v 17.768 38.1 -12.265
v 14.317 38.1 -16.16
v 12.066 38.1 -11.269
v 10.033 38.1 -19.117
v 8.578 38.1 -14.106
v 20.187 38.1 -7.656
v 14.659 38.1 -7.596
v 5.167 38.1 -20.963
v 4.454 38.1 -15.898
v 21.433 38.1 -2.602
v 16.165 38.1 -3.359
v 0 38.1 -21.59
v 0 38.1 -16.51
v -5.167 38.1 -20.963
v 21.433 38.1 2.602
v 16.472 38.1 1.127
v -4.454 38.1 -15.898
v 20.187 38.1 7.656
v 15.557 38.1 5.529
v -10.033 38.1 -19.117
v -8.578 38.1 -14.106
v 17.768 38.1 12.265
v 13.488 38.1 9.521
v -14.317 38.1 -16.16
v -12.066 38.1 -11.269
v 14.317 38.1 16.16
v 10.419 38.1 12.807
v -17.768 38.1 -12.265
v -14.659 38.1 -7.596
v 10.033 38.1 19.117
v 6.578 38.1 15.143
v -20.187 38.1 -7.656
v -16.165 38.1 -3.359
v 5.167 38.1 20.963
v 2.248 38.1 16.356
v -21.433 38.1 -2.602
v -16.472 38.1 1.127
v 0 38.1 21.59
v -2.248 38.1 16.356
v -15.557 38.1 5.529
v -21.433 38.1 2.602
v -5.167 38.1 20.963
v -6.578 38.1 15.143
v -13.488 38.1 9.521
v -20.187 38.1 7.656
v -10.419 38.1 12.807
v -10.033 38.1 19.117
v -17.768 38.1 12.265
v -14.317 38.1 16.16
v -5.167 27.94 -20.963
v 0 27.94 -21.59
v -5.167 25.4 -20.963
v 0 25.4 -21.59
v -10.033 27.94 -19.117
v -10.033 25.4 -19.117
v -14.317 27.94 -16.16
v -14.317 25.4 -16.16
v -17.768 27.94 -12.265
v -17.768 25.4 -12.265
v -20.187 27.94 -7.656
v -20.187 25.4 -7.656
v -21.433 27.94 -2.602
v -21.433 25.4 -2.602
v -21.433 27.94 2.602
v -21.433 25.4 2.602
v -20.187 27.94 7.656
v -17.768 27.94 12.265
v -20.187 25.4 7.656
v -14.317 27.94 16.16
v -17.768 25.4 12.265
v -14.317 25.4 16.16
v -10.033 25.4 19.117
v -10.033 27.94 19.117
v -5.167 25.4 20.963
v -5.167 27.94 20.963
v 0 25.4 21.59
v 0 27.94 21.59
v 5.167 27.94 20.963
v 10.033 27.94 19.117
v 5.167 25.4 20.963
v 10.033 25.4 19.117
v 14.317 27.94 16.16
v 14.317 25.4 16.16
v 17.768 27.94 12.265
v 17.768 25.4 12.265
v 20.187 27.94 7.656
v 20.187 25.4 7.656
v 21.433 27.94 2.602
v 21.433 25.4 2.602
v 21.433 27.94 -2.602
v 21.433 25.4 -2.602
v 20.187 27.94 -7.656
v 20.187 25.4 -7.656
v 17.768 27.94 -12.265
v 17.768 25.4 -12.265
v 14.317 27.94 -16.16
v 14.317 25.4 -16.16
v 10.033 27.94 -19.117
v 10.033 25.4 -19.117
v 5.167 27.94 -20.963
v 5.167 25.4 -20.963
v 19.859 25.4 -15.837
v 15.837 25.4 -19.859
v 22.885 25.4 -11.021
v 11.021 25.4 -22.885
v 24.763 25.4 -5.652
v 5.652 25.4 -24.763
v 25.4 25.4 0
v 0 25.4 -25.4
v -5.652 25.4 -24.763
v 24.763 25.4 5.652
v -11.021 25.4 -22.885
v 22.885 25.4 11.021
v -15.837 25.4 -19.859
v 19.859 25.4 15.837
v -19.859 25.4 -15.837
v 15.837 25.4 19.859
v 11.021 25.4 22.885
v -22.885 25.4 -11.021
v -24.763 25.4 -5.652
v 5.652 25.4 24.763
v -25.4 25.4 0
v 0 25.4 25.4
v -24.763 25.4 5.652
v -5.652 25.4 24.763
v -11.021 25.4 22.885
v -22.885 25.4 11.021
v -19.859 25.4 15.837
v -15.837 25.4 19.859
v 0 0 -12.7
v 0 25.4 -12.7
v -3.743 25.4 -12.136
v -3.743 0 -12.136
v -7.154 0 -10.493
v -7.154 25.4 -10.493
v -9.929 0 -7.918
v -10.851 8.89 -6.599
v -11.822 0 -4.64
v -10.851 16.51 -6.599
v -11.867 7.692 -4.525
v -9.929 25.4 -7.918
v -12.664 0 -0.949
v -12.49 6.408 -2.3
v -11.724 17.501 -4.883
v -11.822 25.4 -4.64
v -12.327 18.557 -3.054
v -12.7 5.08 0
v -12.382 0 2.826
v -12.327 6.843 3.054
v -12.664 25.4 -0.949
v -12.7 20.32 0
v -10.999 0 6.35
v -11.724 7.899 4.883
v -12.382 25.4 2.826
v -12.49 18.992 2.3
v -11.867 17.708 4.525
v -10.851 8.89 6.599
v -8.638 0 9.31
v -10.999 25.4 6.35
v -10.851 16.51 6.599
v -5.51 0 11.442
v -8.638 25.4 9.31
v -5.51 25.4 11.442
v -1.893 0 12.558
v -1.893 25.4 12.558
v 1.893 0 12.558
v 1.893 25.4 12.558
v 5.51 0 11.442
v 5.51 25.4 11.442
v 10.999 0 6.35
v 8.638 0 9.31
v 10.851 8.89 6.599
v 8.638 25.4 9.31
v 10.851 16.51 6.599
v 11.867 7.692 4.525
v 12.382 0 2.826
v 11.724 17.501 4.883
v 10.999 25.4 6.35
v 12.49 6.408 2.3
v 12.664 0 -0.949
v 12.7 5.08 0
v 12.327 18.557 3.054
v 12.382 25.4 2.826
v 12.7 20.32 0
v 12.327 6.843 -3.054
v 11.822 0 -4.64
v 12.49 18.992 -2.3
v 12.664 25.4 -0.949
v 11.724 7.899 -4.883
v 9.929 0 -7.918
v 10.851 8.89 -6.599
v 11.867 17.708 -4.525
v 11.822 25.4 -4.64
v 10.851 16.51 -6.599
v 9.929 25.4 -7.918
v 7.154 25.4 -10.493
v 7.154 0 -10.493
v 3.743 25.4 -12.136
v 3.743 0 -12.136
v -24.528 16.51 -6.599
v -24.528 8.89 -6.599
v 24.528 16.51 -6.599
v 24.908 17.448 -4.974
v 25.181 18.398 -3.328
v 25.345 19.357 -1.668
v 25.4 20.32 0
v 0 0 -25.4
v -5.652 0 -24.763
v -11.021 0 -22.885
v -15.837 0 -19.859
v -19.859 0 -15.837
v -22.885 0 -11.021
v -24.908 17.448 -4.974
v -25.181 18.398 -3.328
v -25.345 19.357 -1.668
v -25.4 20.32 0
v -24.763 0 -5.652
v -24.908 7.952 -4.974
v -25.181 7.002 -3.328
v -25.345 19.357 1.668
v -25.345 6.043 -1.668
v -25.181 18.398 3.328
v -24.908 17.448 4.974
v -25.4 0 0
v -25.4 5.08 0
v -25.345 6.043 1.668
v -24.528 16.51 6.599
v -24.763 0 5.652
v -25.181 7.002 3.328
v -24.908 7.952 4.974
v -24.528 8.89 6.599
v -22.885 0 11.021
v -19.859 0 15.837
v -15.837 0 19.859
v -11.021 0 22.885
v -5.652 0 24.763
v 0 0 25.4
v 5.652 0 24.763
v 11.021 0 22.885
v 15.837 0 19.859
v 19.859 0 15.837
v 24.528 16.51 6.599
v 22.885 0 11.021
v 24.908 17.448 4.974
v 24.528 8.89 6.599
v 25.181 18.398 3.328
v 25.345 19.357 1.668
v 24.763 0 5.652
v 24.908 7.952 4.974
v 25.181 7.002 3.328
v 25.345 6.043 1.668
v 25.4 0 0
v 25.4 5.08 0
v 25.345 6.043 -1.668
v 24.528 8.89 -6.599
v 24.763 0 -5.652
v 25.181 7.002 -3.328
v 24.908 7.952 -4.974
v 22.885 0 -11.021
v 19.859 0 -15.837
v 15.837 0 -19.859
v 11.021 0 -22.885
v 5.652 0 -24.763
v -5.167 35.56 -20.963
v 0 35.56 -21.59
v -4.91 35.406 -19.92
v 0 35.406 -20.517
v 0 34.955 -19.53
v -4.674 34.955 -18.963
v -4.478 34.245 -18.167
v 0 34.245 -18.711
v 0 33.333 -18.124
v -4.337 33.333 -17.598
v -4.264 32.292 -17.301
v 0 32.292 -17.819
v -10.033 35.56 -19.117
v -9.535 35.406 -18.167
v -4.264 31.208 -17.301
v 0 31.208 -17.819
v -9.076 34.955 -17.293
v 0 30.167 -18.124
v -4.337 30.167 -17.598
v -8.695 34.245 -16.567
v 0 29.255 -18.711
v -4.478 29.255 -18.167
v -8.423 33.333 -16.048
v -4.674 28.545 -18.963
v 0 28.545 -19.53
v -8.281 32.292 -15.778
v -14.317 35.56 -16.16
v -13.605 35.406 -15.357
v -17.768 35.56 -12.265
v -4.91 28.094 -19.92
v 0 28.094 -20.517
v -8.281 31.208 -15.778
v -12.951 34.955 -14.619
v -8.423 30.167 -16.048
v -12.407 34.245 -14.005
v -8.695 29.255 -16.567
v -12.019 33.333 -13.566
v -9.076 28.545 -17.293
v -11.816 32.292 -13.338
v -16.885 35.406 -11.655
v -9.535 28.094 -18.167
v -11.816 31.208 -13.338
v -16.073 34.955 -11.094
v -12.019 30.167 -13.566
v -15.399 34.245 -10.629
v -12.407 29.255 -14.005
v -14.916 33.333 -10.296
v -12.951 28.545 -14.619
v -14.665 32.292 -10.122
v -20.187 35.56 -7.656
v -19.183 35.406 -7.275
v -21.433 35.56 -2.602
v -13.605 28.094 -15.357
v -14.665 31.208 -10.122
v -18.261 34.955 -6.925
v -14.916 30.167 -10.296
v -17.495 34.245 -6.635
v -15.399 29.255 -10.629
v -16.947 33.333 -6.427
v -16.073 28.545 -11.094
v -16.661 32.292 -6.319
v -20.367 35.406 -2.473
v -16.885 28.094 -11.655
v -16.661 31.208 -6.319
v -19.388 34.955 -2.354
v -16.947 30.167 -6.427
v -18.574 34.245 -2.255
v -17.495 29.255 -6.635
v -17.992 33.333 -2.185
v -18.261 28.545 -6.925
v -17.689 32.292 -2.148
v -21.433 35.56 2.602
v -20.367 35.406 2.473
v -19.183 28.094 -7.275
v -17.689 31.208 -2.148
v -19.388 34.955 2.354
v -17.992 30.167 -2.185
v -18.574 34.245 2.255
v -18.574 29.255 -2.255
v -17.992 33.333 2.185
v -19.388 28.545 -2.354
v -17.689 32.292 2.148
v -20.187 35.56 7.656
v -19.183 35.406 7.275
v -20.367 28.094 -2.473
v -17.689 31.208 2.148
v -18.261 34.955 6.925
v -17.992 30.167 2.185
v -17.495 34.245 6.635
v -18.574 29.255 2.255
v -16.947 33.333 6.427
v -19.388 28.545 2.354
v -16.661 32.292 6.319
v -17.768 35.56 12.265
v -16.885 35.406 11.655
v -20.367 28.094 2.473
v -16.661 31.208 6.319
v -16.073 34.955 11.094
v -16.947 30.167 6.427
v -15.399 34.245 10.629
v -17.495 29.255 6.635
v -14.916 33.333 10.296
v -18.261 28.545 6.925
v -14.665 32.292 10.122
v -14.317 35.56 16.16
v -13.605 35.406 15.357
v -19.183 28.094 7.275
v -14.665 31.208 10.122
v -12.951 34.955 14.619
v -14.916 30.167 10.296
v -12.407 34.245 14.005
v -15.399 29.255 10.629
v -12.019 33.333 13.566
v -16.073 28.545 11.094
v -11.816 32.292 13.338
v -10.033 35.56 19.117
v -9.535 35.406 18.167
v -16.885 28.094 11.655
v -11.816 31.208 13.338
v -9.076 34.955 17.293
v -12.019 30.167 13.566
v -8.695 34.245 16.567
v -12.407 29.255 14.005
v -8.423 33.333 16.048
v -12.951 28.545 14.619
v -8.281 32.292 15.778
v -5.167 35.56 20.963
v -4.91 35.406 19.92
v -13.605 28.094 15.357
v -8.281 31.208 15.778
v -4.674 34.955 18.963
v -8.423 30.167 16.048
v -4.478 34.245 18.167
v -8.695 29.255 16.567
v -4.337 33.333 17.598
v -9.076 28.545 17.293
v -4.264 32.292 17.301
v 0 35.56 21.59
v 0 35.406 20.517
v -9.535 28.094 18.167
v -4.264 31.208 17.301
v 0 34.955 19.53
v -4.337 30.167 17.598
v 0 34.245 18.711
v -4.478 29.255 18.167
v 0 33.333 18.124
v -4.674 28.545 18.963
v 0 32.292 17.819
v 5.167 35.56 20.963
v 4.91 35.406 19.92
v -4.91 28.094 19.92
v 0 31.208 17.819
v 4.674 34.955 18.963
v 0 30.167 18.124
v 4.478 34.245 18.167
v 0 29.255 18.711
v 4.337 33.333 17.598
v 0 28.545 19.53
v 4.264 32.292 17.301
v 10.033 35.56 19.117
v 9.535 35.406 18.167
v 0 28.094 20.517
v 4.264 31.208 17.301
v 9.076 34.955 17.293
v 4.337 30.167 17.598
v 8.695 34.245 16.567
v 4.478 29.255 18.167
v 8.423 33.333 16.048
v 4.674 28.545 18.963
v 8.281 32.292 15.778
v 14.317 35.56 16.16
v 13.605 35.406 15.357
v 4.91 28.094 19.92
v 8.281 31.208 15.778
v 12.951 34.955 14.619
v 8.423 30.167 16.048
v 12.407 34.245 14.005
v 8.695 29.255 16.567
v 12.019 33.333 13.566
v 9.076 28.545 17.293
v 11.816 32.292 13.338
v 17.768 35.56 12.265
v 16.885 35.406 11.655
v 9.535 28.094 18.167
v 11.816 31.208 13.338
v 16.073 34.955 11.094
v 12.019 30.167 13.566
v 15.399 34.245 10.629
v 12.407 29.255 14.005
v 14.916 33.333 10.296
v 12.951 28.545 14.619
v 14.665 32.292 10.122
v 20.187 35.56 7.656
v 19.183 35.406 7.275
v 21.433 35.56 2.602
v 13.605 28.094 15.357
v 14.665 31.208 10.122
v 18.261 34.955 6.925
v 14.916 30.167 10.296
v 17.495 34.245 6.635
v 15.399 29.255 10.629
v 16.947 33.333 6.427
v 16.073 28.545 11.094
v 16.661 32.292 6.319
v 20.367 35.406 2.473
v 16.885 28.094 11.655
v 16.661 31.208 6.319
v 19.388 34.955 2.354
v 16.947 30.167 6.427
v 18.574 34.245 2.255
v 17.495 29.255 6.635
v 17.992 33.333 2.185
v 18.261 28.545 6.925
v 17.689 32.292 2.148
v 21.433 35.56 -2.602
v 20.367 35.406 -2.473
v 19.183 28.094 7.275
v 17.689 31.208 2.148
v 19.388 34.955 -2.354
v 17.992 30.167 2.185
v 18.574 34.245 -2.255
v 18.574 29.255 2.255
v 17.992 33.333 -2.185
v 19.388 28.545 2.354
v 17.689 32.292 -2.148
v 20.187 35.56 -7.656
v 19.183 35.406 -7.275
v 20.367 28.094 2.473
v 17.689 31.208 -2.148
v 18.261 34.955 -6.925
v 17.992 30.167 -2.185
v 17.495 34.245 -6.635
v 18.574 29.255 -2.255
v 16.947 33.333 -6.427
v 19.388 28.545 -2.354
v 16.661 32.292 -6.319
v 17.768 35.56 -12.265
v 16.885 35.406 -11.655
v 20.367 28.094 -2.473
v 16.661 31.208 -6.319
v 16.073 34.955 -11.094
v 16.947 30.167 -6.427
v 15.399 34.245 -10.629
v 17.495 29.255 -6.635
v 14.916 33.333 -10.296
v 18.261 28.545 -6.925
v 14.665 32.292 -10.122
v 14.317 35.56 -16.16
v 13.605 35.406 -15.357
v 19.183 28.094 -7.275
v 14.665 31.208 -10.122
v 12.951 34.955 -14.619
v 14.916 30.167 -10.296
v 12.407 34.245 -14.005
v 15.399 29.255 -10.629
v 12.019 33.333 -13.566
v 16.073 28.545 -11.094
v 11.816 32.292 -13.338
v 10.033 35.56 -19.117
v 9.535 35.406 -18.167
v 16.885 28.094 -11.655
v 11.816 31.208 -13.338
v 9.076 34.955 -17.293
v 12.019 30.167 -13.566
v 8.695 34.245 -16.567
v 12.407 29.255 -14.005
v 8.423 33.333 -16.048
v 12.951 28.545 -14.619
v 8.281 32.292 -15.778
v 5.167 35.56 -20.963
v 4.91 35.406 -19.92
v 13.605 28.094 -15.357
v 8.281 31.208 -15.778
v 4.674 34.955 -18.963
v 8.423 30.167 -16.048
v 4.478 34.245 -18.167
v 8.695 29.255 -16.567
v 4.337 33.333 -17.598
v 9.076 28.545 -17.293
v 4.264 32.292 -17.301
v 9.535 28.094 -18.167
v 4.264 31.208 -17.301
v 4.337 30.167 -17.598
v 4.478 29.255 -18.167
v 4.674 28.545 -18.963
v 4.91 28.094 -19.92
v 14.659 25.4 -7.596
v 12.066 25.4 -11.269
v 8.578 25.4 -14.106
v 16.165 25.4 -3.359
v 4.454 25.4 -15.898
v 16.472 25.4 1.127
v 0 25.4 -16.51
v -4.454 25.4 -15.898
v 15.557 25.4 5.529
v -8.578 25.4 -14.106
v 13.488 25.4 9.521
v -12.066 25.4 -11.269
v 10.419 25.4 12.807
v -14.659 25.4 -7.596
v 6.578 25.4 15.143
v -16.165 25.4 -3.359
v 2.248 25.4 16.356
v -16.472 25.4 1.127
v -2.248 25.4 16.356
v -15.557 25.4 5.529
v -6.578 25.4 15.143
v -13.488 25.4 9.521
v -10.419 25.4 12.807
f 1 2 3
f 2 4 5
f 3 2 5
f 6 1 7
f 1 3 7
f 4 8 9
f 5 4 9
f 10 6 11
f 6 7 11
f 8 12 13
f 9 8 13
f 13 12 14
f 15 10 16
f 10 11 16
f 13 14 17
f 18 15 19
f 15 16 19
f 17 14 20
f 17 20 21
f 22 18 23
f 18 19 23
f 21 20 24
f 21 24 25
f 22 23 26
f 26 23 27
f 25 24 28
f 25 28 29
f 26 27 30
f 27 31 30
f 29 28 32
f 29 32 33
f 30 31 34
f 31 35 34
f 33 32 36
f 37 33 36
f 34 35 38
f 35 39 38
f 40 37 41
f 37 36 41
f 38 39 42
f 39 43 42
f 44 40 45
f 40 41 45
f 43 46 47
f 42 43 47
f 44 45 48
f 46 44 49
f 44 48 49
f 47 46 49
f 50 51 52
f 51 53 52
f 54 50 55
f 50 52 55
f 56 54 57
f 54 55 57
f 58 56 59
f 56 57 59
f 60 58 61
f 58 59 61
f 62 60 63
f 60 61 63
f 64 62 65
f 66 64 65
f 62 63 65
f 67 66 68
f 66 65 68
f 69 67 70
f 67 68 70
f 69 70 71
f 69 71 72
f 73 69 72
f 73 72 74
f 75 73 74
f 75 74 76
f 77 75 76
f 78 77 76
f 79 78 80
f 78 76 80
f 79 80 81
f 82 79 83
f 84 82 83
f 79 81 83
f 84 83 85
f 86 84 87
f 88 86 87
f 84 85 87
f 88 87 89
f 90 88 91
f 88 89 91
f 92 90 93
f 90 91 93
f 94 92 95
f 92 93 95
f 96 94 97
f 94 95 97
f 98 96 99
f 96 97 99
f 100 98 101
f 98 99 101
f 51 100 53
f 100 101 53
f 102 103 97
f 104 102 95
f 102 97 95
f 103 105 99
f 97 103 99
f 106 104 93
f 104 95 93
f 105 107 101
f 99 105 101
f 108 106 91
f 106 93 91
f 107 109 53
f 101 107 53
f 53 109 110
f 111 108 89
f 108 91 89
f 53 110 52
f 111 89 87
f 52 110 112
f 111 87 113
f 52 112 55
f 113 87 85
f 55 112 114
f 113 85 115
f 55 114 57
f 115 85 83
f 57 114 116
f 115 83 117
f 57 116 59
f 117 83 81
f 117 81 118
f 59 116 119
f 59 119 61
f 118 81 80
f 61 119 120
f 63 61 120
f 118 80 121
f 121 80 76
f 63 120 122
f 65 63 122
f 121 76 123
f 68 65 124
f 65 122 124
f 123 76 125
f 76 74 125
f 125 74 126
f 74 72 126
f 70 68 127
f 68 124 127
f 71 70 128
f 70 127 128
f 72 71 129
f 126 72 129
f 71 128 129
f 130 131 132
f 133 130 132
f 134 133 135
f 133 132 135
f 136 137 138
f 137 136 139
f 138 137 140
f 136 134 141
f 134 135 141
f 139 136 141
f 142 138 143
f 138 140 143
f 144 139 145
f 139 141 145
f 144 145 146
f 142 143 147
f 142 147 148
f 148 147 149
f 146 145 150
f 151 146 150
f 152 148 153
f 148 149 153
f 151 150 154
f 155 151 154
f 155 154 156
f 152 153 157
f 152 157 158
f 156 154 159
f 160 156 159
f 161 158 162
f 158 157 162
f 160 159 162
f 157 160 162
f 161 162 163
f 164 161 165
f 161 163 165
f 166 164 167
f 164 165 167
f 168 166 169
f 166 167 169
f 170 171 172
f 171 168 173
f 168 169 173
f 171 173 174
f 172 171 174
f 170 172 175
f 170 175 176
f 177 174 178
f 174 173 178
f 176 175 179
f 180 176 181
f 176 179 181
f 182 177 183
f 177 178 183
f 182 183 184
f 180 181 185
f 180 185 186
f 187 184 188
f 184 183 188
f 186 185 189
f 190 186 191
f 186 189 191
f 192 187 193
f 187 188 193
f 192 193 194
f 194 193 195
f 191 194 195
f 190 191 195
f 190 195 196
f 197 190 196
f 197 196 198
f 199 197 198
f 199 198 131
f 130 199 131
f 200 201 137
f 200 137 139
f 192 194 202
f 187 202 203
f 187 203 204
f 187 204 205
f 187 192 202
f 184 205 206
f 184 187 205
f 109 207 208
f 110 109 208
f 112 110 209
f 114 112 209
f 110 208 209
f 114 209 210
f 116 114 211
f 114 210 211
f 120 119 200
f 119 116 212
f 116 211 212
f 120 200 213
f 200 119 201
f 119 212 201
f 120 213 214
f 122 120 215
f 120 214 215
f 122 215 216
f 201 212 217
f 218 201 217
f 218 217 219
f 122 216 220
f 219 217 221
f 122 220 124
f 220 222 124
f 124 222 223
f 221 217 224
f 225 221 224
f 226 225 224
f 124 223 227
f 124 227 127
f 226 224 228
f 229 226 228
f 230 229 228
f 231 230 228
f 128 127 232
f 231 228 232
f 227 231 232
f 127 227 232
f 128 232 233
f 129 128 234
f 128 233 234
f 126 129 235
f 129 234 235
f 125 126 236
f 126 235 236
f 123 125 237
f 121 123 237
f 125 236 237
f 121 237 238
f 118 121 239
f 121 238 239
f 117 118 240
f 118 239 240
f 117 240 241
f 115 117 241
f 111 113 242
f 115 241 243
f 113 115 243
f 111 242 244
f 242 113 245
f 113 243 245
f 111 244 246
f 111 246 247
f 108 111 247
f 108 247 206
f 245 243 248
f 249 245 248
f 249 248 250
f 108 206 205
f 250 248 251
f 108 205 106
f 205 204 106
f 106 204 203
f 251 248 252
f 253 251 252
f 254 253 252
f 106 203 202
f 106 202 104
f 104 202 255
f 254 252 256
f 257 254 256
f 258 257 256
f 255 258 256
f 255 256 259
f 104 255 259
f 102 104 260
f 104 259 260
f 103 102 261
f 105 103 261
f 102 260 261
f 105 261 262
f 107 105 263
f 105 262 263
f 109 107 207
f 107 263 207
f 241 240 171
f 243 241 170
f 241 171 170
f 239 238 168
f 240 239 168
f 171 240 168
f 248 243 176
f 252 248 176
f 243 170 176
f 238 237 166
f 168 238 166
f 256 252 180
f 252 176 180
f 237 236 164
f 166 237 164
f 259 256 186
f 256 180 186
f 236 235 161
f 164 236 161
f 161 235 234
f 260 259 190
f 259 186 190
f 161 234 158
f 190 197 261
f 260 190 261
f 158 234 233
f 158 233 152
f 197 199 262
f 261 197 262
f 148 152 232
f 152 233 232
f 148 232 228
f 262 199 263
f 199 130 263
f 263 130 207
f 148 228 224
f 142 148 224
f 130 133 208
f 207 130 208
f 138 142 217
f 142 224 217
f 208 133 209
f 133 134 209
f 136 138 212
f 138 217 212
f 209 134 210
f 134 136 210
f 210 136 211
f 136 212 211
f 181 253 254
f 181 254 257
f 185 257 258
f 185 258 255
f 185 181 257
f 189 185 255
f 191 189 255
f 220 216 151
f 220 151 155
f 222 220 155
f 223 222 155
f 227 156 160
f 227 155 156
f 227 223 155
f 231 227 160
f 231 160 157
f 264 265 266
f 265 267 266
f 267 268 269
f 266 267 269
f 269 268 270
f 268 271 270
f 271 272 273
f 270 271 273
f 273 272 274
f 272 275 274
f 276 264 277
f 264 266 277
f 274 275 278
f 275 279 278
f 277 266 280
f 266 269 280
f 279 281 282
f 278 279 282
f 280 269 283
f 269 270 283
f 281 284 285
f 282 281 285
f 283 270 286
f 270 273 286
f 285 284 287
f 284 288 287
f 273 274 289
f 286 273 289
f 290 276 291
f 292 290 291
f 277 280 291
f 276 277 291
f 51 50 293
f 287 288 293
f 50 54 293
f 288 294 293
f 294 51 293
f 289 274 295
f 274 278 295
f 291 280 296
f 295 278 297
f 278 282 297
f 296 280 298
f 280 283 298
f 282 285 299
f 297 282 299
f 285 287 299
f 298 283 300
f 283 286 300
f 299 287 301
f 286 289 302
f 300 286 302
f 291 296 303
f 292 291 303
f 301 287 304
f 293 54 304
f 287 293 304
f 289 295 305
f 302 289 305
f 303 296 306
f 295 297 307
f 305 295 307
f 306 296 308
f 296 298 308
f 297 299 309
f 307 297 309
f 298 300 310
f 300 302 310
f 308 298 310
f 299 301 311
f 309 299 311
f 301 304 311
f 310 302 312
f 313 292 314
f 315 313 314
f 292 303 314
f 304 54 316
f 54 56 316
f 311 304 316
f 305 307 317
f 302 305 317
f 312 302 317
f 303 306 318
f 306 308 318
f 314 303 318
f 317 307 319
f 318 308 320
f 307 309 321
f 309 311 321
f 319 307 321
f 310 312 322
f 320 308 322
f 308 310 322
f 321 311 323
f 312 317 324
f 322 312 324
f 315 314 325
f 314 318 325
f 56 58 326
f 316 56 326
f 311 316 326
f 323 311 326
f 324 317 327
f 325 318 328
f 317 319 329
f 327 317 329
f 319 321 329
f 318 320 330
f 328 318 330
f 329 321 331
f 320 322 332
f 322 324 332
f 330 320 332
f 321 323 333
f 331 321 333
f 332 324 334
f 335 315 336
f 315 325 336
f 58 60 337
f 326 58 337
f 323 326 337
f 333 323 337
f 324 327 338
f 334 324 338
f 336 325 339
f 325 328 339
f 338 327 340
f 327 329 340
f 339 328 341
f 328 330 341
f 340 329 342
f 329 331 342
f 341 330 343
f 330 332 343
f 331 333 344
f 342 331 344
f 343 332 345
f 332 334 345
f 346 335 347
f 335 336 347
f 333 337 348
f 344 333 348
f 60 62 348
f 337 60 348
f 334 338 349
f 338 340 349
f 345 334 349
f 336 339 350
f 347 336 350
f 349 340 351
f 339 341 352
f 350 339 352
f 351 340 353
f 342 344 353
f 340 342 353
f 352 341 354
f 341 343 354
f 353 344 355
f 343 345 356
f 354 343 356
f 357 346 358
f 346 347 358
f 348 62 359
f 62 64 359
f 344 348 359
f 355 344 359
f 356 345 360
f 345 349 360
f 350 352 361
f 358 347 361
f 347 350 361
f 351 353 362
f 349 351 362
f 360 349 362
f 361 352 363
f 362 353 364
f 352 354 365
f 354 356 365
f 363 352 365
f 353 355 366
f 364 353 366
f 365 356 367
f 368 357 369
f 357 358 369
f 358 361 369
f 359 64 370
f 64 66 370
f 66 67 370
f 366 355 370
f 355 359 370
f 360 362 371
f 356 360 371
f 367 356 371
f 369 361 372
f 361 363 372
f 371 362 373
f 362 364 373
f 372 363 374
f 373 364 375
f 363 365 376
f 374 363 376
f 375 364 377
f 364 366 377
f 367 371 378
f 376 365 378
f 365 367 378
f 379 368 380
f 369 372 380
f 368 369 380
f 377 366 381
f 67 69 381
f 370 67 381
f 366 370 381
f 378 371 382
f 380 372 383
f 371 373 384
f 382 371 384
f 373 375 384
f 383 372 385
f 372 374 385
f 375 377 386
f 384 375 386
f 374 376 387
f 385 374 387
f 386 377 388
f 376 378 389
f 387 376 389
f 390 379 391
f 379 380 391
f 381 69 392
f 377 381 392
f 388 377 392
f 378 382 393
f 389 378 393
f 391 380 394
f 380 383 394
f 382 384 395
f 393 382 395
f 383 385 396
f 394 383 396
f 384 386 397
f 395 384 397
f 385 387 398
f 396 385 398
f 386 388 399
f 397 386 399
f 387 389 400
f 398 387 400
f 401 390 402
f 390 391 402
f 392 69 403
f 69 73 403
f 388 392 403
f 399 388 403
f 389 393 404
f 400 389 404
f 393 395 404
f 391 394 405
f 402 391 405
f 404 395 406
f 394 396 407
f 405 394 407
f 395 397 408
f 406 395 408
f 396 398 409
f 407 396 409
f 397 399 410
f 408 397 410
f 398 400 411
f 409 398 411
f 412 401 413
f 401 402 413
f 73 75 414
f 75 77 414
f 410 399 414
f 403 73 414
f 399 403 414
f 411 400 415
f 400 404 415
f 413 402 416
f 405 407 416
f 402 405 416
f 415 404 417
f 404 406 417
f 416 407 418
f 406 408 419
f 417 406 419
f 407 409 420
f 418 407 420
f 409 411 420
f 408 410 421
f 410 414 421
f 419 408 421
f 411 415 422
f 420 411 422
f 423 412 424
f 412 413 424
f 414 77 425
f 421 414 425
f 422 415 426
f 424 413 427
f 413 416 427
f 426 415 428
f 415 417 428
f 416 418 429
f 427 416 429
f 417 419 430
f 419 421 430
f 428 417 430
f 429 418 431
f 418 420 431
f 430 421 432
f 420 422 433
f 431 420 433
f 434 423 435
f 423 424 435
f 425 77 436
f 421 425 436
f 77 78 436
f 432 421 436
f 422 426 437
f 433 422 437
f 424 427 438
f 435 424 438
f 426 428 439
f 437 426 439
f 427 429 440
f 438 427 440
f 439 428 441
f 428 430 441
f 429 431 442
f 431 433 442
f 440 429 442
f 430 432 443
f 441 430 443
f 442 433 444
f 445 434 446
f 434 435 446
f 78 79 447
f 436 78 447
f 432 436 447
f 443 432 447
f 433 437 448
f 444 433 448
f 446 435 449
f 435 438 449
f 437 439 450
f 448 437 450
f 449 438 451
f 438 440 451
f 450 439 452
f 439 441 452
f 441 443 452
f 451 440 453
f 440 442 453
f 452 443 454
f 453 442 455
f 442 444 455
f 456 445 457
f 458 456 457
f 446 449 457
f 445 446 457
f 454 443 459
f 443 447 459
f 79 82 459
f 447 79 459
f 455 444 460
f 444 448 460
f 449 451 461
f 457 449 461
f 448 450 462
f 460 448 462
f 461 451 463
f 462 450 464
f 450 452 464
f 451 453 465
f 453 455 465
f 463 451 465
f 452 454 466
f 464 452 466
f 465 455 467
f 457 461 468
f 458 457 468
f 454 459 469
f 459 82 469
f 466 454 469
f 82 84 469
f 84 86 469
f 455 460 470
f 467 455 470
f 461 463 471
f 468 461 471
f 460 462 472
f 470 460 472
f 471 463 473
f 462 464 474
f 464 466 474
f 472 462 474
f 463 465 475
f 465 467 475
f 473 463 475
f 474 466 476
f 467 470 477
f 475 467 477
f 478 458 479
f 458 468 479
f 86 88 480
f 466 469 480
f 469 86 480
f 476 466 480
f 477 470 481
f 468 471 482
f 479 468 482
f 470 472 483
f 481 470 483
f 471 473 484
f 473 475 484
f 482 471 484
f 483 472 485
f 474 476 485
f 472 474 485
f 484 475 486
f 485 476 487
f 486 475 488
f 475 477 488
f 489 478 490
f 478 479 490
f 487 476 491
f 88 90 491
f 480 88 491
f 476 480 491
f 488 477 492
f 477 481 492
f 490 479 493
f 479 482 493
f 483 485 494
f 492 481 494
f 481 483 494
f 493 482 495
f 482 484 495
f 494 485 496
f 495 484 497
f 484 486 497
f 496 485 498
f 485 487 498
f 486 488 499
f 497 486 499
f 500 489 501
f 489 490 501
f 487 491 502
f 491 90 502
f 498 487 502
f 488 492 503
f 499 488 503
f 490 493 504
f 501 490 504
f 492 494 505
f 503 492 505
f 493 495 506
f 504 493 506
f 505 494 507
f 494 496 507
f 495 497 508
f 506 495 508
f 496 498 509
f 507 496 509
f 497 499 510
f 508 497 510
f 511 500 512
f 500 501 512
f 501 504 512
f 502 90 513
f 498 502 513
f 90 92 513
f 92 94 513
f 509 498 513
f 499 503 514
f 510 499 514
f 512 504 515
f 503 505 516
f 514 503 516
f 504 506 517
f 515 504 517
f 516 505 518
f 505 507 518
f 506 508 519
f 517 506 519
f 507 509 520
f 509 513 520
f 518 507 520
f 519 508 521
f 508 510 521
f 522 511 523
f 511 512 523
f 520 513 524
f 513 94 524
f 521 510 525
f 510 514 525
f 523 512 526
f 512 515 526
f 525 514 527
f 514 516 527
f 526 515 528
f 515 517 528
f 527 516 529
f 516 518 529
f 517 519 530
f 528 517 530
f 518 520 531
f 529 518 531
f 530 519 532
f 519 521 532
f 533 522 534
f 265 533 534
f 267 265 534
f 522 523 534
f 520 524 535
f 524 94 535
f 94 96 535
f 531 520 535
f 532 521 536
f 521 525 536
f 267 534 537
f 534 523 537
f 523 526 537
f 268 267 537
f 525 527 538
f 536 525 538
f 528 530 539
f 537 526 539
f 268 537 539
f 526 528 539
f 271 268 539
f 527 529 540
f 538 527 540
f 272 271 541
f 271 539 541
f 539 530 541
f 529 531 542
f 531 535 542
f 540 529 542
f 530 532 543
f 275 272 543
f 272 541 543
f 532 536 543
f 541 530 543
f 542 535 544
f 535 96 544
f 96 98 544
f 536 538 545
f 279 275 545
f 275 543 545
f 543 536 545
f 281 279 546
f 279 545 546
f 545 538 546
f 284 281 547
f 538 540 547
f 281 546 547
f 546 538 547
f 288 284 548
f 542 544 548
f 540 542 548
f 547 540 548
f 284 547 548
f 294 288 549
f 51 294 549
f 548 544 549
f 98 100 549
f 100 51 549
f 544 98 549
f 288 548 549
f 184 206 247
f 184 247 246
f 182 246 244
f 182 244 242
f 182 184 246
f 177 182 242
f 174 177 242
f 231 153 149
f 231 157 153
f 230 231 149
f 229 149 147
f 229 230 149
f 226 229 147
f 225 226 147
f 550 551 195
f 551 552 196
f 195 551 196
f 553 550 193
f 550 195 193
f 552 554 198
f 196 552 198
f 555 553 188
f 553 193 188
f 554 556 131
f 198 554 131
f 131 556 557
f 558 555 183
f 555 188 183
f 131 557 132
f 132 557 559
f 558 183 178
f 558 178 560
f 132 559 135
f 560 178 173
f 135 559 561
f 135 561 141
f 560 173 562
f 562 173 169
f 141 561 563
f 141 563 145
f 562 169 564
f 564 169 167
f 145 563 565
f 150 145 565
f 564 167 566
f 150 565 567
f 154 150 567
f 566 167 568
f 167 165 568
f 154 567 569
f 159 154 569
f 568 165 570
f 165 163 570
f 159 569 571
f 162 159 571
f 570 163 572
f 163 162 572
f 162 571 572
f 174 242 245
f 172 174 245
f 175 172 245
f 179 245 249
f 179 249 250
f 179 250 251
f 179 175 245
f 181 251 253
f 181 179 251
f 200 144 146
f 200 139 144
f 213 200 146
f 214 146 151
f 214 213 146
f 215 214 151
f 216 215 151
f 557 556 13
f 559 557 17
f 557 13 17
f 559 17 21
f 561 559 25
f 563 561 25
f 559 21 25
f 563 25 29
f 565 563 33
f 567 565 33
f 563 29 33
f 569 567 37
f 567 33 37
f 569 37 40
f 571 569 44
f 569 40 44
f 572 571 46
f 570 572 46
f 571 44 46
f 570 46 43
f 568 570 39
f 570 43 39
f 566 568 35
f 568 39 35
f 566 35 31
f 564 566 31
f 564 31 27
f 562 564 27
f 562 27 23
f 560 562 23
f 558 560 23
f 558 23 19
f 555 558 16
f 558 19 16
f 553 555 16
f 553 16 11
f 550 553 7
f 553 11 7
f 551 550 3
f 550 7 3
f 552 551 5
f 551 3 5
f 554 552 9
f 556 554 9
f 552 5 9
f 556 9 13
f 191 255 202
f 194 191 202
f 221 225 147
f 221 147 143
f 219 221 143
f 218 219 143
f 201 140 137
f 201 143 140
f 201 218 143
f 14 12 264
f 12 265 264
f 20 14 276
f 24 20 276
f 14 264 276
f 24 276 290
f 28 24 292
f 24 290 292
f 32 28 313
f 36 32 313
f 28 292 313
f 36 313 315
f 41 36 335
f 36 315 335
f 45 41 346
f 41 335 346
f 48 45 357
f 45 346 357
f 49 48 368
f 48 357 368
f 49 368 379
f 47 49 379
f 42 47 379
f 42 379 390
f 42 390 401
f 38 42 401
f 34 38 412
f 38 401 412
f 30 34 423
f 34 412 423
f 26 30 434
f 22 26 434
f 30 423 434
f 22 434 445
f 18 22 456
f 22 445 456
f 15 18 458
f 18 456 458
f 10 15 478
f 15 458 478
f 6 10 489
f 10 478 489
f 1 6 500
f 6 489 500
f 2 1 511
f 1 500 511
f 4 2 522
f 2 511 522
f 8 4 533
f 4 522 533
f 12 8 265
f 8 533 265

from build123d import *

# Parameters (mm, degrees)
CUT_EXTRUDE1_DEPTH      = 53.363441445
CUT_EXTRUDE1_DEPTH_BACK = 53.363441445


with BuildPart() as part:
    # Sketch1 → Revolve1 (revolve)
    with BuildSketch(Plane.XY, mode=Mode.PRIVATE) as revolve1_sk:
        with BuildLine():
            Line((12.7, 0), (12.7, 25.4))
            Line((12.7, 25.4), (16.51, 25.4))
            Line((16.51, 25.4), (16.51, 38.1))
            Line((16.51, 38.1), (21.59, 38.1))
            Line((21.59, 38.1), (21.59, 35.56))
            ThreePointArc((21.59, 35.56), (17.78, 31.75), (21.59, 27.94))
            Line((21.59, 27.94), (21.59, 25.4))
            Line((21.59, 25.4), (25.4, 25.4))
            Line((25.4, 25.4), (25.4, 0))
            Line((25.4, 0), (12.7, 0))
        make_face()
    revolve(revolve1_sk.sketch.rotate(Axis((0, 0, 0), (0, 1, 0)), 90), axis=Axis((0, 0, 0), (0, 1, 0)))

    # Sketch2 → Cut-Extrude1 (cut, two sides: drawn at the far end of the back side and taken through both)
    with BuildSketch(Plane(origin=(0, 0, 0), x_dir=(0, 0, -1), z_dir=(1, 0, 0)).offset(-CUT_EXTRUDE1_DEPTH_BACK)):
        Polygon((0, 20.32), (-6.599113577, 16.51), (-6.599113577, 8.89), (0, 5.08), (6.599113577, 8.89), (6.599113577, 16.51), align=None)
    extrude(amount=CUT_EXTRUDE1_DEPTH + CUT_EXTRUDE1_DEPTH_BACK, mode=Mode.SUBTRACT)


solid = part.part
